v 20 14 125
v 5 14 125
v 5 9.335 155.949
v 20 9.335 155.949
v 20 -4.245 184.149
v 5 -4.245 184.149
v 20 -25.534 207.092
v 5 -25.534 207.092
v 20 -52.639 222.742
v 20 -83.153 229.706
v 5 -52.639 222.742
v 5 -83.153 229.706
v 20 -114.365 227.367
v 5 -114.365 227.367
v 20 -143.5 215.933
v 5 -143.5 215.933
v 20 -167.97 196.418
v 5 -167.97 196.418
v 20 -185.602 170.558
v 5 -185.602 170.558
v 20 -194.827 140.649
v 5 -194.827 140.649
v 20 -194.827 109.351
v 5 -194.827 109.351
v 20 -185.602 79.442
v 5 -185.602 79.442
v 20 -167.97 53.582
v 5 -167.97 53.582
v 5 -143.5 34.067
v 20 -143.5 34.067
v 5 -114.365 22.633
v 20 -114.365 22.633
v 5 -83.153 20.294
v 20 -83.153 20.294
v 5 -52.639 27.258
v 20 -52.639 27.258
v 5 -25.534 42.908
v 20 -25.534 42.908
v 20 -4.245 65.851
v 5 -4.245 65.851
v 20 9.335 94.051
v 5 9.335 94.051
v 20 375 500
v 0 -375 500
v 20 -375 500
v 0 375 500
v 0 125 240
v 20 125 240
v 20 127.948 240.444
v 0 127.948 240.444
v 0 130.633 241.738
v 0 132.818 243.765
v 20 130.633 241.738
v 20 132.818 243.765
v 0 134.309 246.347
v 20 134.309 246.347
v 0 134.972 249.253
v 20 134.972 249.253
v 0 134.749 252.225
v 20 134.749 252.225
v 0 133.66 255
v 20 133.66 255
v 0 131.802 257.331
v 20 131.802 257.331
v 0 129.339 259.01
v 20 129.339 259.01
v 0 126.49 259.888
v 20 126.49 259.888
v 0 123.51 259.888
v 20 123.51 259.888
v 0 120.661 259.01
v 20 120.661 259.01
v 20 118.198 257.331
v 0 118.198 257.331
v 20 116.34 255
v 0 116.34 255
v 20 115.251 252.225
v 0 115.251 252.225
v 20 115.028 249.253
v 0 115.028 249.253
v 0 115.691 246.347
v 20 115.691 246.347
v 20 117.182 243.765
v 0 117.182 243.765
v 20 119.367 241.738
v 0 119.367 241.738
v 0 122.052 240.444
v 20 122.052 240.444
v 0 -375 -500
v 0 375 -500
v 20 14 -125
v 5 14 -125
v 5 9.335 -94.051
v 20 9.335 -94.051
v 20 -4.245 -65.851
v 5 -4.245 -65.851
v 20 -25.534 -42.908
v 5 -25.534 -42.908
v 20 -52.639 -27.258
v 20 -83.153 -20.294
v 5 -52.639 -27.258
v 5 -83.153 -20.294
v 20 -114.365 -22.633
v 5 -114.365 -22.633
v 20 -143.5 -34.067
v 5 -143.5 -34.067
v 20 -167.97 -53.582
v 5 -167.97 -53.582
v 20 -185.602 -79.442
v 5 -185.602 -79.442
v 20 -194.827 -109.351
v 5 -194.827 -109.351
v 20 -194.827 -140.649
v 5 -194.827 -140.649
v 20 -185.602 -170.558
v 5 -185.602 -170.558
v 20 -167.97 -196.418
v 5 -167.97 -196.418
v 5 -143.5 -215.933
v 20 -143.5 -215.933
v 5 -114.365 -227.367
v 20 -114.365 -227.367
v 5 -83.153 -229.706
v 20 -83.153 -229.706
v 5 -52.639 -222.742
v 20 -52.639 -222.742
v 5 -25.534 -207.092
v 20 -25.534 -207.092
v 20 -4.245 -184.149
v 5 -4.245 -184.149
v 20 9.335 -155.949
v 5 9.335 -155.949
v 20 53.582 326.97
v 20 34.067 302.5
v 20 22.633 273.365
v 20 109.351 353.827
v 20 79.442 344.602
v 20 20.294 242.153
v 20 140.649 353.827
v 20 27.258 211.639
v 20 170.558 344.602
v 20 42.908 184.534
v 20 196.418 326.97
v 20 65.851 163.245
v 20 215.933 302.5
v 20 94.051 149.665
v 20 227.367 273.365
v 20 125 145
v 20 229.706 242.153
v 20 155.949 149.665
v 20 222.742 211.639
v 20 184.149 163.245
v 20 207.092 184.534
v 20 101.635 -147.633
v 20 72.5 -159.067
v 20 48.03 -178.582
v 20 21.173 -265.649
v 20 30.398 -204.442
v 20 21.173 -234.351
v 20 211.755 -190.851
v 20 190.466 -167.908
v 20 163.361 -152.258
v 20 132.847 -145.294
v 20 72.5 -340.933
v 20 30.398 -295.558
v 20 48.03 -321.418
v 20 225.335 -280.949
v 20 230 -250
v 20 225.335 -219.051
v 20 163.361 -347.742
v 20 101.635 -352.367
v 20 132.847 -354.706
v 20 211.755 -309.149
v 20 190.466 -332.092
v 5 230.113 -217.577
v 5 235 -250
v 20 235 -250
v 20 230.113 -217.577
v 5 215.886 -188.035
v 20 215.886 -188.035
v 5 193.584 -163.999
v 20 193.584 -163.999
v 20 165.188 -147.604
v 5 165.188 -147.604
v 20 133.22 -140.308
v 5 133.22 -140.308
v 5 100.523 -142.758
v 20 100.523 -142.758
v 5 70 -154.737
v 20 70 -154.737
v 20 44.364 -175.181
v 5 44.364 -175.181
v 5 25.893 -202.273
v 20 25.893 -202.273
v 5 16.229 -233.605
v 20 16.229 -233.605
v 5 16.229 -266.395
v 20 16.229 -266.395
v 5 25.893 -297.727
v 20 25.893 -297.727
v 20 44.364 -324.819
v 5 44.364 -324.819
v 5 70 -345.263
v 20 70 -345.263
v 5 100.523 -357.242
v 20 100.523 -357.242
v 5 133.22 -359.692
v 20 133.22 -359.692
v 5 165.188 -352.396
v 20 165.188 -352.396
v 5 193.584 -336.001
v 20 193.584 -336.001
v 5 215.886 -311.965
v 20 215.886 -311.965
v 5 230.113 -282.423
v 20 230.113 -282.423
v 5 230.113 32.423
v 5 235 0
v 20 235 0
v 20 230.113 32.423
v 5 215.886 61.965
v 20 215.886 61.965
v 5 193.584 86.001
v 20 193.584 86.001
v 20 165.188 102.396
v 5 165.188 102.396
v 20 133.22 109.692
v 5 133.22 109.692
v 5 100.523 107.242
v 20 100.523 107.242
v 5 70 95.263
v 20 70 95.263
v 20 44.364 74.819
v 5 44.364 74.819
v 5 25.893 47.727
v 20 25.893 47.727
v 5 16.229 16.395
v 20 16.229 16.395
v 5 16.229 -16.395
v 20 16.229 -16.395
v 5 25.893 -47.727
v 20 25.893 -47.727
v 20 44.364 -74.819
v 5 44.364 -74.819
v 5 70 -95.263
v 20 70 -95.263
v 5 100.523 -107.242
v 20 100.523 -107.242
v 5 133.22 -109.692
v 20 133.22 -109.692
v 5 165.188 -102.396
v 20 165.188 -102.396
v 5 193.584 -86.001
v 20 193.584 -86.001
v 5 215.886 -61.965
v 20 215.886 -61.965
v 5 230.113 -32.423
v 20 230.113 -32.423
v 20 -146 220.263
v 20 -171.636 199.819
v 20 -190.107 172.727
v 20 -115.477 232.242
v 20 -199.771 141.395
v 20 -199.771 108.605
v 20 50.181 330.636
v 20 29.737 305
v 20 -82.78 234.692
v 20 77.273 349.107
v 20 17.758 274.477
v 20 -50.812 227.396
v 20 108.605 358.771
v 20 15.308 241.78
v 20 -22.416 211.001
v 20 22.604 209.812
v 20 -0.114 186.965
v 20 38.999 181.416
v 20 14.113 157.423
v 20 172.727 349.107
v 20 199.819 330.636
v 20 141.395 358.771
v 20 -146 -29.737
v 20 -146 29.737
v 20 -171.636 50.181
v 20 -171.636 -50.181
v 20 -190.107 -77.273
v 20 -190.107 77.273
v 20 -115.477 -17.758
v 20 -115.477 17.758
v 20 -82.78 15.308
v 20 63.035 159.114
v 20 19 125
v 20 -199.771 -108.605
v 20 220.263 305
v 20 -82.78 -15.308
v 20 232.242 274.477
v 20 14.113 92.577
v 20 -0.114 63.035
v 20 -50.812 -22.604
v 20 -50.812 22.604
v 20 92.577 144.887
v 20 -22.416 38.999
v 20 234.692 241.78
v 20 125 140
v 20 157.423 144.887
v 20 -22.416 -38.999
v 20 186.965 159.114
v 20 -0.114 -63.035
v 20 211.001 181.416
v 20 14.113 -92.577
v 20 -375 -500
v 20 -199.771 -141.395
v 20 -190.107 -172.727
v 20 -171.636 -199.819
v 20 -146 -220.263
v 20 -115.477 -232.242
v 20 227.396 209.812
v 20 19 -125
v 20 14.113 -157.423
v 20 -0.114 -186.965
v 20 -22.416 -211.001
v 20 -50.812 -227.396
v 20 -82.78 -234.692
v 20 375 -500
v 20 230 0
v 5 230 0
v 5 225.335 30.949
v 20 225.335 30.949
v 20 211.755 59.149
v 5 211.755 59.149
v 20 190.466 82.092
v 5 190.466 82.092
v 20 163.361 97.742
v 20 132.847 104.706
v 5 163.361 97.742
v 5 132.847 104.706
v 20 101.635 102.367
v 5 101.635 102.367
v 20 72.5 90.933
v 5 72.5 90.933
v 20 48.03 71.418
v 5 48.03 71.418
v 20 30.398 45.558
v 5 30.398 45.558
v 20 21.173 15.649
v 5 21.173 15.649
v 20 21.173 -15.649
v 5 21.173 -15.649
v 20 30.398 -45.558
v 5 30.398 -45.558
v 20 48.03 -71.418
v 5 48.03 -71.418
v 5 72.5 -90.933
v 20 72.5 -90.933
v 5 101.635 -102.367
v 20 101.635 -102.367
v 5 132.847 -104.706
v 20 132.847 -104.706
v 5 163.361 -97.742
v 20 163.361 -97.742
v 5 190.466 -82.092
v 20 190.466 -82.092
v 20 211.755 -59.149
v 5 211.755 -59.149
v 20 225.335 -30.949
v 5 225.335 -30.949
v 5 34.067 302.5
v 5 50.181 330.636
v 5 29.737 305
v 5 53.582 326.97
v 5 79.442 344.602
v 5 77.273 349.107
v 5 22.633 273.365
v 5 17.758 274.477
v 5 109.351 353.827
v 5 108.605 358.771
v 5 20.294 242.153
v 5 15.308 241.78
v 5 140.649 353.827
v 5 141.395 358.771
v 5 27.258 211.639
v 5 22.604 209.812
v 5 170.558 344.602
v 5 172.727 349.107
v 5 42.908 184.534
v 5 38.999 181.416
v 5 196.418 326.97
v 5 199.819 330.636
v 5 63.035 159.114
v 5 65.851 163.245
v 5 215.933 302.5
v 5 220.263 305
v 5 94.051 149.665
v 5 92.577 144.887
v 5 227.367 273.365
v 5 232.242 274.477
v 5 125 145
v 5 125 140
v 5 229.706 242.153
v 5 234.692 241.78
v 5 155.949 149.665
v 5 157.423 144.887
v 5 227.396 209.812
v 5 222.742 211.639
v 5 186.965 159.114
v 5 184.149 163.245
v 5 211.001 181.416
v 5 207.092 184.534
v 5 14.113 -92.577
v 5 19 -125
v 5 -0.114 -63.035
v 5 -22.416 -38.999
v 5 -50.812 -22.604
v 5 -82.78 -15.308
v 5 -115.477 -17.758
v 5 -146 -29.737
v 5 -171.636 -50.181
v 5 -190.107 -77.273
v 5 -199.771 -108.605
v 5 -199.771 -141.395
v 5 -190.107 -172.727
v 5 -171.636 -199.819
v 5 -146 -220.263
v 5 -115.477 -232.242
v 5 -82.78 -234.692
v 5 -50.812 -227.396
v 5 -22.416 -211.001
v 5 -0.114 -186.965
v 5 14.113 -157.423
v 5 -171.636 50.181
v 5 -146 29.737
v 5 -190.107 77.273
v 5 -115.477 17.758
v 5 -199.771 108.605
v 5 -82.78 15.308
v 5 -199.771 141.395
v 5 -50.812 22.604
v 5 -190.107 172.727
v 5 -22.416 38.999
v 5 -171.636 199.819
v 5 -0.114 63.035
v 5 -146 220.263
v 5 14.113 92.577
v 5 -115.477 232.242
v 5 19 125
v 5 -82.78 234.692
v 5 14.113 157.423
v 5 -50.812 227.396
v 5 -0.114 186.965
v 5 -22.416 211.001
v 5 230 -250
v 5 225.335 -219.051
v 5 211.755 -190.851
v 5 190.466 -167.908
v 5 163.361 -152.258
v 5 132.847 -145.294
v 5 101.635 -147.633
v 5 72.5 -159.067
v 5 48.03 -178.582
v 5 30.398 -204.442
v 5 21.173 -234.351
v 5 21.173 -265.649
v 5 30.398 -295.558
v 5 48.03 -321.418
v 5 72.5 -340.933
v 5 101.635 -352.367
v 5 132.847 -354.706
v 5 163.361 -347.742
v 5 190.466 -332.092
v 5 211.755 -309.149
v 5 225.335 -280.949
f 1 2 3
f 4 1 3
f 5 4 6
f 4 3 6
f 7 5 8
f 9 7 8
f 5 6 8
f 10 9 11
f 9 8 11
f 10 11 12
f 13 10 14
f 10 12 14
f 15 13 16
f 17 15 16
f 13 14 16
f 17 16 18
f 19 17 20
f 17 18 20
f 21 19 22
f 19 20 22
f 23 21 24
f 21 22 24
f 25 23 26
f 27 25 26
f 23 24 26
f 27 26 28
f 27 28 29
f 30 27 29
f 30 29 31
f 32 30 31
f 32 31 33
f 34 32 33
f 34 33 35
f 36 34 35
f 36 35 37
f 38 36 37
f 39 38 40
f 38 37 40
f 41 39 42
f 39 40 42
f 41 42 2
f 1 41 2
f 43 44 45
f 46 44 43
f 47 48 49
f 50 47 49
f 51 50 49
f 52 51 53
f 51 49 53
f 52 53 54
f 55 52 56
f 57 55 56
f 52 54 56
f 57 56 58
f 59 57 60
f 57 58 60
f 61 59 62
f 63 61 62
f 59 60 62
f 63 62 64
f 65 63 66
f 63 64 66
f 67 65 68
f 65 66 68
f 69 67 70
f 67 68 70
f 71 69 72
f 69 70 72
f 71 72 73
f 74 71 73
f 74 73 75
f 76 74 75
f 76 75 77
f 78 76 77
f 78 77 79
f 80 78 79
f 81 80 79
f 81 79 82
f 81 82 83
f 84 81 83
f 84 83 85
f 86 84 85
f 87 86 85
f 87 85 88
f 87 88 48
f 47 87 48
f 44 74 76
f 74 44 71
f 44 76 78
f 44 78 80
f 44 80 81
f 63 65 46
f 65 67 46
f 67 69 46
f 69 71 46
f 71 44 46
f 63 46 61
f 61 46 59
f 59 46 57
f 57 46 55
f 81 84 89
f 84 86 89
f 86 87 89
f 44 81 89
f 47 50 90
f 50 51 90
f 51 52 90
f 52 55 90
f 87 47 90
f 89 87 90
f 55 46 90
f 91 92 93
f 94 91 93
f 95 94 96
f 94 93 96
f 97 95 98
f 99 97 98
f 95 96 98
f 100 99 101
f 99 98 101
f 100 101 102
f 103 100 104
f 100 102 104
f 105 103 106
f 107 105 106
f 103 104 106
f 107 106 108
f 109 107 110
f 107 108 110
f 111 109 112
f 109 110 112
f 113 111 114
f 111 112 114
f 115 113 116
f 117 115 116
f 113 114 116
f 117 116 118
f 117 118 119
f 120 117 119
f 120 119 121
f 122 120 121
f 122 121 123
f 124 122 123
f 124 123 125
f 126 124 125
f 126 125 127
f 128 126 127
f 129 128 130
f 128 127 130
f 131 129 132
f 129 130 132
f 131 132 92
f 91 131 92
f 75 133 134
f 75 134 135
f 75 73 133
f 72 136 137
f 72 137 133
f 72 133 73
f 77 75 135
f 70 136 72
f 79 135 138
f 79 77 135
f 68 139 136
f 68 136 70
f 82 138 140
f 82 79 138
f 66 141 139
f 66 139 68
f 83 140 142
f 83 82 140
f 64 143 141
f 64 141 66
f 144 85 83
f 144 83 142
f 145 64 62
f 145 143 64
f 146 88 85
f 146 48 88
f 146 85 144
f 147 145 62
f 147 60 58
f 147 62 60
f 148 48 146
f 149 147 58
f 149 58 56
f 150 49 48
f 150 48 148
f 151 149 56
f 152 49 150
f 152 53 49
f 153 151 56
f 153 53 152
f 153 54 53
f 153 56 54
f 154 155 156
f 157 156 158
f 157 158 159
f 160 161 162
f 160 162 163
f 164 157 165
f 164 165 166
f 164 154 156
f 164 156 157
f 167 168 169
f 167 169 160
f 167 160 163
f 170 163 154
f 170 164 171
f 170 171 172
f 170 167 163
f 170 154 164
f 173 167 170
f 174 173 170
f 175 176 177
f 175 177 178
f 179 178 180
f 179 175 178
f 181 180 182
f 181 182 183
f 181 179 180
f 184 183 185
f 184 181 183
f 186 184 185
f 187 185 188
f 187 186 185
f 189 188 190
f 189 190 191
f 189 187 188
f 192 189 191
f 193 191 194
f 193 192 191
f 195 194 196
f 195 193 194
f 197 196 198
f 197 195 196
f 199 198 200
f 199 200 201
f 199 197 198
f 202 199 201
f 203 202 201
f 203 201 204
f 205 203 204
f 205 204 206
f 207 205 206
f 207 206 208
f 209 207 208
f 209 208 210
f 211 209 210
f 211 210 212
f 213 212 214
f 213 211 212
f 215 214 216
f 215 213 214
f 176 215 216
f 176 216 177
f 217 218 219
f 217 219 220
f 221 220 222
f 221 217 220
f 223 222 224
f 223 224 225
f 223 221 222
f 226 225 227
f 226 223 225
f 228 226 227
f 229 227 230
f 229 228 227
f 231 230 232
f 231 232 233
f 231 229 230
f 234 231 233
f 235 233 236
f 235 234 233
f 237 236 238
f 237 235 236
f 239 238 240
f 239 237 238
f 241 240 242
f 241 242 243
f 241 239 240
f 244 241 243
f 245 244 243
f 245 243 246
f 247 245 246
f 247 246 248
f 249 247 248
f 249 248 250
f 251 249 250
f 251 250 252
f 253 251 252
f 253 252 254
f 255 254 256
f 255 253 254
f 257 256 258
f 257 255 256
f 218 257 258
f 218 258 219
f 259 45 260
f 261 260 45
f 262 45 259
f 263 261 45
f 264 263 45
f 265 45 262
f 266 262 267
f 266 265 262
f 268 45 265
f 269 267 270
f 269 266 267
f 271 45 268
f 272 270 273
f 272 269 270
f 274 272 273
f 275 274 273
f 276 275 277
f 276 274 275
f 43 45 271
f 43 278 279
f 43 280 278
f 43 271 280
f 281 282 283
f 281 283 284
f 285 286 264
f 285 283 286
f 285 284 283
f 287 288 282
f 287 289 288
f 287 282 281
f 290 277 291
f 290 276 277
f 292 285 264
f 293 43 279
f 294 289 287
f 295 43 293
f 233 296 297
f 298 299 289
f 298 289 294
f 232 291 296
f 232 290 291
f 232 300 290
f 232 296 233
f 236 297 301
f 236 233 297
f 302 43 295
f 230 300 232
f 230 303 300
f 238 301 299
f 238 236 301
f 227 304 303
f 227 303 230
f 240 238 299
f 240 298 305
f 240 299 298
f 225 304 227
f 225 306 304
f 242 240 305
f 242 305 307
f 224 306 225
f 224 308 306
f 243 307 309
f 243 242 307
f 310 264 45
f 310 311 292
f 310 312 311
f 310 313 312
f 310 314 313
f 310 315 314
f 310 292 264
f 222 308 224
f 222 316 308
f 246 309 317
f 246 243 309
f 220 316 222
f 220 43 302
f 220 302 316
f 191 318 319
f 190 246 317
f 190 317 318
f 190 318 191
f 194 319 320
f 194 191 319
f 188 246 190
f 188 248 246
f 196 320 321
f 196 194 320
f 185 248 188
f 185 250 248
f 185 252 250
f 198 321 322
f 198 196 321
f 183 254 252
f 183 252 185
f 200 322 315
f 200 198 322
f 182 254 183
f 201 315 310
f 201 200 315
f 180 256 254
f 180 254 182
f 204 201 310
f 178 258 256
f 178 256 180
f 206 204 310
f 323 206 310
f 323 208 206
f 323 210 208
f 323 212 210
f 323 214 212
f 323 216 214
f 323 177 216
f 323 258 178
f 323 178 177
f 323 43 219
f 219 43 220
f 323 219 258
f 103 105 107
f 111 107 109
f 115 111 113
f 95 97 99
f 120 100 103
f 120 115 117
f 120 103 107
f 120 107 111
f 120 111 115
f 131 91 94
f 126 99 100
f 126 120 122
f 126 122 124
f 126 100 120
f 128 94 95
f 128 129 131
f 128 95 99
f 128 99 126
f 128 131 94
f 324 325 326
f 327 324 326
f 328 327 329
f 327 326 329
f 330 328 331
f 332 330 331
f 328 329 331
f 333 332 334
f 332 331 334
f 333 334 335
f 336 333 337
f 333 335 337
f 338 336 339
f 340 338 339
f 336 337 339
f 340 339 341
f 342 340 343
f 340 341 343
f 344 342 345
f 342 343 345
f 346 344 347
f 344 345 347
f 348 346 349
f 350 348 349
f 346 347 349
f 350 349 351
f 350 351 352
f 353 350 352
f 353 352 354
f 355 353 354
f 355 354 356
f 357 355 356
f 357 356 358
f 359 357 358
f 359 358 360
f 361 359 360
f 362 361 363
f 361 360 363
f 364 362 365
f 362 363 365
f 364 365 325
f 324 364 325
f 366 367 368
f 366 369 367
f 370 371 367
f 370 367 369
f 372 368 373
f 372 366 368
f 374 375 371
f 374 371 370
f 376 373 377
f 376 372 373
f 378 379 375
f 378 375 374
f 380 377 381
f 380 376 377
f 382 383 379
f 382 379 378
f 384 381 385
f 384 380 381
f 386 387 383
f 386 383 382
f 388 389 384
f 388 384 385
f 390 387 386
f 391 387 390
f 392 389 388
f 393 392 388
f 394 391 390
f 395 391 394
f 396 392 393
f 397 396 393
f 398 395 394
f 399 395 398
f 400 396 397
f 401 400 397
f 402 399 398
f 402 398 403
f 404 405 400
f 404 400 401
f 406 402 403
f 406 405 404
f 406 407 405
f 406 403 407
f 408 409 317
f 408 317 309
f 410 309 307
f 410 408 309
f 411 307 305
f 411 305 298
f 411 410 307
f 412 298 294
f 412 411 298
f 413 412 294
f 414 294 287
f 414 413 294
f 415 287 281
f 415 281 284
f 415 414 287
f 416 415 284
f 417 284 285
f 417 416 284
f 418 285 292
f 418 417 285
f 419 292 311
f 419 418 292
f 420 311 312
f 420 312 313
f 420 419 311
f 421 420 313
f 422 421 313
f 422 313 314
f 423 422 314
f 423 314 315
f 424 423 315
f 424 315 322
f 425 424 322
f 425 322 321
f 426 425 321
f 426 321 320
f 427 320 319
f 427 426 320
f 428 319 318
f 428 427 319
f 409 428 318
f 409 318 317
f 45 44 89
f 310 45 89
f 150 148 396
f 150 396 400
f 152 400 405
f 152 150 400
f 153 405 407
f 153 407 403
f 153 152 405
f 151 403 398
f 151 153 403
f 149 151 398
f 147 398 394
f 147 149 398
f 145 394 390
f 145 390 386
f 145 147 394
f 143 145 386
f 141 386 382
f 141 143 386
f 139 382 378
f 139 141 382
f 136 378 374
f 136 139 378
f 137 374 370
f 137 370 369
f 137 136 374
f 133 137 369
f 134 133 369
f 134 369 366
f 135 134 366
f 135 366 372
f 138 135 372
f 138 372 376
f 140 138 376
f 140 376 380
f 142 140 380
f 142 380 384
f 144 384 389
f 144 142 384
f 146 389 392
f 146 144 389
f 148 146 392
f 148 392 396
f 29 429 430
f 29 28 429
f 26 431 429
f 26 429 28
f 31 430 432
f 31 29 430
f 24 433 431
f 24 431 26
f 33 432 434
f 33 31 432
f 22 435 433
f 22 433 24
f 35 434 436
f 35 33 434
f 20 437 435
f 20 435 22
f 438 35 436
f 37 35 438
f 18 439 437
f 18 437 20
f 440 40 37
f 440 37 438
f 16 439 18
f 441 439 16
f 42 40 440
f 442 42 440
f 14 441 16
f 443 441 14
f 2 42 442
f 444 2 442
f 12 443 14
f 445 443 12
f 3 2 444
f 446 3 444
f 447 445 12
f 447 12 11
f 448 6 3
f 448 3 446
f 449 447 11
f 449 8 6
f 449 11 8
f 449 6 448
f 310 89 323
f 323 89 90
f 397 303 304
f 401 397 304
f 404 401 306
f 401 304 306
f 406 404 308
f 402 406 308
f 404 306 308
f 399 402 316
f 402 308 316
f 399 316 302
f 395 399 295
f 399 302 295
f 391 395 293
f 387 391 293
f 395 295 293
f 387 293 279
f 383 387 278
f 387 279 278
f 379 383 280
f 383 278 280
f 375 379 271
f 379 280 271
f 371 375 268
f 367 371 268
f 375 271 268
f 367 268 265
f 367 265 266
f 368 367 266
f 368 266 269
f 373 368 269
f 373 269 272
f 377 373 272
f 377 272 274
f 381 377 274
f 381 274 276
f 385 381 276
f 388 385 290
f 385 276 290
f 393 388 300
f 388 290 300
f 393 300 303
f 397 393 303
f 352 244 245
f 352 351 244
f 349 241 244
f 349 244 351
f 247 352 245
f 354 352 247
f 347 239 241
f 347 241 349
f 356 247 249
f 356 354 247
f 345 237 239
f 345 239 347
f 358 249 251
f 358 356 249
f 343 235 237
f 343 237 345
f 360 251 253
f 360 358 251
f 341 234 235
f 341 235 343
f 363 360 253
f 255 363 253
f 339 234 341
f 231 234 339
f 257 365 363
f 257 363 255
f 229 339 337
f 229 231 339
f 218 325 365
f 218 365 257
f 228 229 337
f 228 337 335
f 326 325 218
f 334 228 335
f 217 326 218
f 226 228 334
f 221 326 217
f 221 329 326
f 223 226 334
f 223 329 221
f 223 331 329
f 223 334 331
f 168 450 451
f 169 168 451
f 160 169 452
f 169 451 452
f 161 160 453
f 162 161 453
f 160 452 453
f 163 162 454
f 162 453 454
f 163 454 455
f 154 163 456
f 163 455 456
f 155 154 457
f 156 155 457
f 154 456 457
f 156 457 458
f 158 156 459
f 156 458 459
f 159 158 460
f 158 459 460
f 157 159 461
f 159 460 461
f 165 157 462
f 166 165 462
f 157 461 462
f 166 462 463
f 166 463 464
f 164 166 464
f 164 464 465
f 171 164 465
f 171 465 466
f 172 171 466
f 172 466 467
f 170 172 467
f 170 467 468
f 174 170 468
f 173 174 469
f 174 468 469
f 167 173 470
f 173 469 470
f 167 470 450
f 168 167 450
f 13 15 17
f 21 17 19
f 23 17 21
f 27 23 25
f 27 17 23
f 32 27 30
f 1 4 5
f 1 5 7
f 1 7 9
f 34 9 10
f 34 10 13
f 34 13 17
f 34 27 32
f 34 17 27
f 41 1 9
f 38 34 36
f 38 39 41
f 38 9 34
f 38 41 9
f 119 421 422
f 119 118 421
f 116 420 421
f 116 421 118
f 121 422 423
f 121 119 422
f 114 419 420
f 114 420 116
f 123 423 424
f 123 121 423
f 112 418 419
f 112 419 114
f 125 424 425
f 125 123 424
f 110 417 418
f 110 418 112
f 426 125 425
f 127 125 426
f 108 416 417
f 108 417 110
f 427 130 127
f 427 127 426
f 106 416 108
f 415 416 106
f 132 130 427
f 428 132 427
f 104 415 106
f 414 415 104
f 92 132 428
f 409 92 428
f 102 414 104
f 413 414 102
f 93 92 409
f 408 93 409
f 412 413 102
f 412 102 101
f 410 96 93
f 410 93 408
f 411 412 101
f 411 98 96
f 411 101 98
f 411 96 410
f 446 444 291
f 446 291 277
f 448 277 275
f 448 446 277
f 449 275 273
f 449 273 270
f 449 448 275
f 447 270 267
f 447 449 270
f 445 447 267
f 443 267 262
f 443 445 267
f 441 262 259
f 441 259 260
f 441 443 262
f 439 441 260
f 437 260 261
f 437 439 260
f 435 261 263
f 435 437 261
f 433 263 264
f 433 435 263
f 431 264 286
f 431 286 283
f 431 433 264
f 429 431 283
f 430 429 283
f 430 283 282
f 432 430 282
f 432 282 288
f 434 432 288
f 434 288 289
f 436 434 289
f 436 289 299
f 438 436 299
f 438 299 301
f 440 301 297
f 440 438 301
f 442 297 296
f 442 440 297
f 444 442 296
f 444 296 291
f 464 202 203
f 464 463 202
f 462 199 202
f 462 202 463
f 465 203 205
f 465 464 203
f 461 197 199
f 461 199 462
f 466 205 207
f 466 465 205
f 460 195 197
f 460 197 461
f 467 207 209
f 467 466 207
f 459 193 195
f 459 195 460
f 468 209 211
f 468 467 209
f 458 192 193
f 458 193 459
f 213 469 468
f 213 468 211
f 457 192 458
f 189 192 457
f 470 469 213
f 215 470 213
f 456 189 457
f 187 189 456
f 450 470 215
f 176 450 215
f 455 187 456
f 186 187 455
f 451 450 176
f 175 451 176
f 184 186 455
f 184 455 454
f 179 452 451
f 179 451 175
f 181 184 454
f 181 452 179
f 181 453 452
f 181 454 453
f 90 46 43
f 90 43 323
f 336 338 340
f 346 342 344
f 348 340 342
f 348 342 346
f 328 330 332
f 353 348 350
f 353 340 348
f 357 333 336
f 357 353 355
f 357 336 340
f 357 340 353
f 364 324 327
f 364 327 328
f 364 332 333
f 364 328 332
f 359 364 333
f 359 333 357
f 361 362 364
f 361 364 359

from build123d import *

# Parameters (mm, degrees)
MAIN_BOARD_W          = 1000
MAIN_BOARD_H          = 750
MAINBOARD_DEPTH       = 20
CUT_EXTRUDE9_REACH    = 627.32
SKETCH5_R             = 10
SKETCH5_8_R           = 110
SKETCH5_8_R_2         = 105
CUT_EXTRUDE10_DEPTH   = 15
LPATTERN1_START       = 5
LPATTERN1_OUTLINE_R   = 110
LPATTERN1_OUTLINE_R_2 = 105
LPATTERN1_DEPTH       = 15


# Read off the part's stored shape, not the designer's step: LPattern1
with BuildPart() as part:
    # Main Board → MainBoard (new body)
    with BuildSketch(Plane(origin=(0, 0, 0), x_dir=(0, 0, -1), z_dir=(1, 0, 0))):
        Rectangle(MAIN_BOARD_W, MAIN_BOARD_H)
    extrude(amount=MAINBOARD_DEPTH)

    # Sketch5 → Cut-Extrude9 (cut, up to next)
    with BuildSketch(Plane(origin=(20, 0, 0), x_dir=(0, 0, -1), z_dir=(1, 0, 0)), mode=Mode.PRIVATE) as cut_extrude9_sk1:
        with Locations((-250, 125)):
            Circle(SKETCH5_R)
    cut_extrude9_tool1 = extrude(cut_extrude9_sk1.sketch, amount=-CUT_EXTRUDE9_REACH, mode=Mode.PRIVATE) & part.part
    add(cut_extrude9_tool1.solids().sort_by_distance((20, 125, 250))[0], mode=Mode.SUBTRACT)

    # Sketch5<8> → Cut-Extrude10 (cut)
    with BuildSketch(Plane(origin=(20, 0, 0), x_dir=(0, 0, -1), z_dir=(1, 0, 0))):
        with Locations((-250, 125)):
            Circle(SKETCH5_8_R)
        with Locations((-250, 125)):
            Circle(SKETCH5_8_R_2, mode=Mode.SUBTRACT)
    extrude(amount=-CUT_EXTRUDE10_DEPTH, mode=Mode.SUBTRACT)

    # LPattern1 outline → LPattern1 (cut)
    # profile 1 of 4: a face of its own
    with BuildSketch(Plane.YZ.offset(LPATTERN1_START)):
        with Locations((-91, 125)):
            Circle(LPATTERN1_OUTLINE_R)
        with Locations((-91, 125)):
            Circle(LPATTERN1_OUTLINE_R_2, mode=Mode.SUBTRACT)
    # profile 2 of 4: a face of its own
    with BuildSketch(Plane.YZ.offset(LPATTERN1_START)):
        with Locations((125, -250)):
            Circle(LPATTERN1_OUTLINE_R)
        with Locations((125, -250)):
            Circle(LPATTERN1_OUTLINE_R_2, mode=Mode.SUBTRACT)
    # profile 3 of 4: a face of its own
    with BuildSketch(Plane.YZ.offset(LPATTERN1_START)):
        with Locations((125, 0)):
            Circle(LPATTERN1_OUTLINE_R)
        with Locations((125, 0)):
            Circle(LPATTERN1_OUTLINE_R_2, mode=Mode.SUBTRACT)
    # profile 4 of 4: a face of its own
    with BuildSketch(Plane.YZ.offset(LPATTERN1_START)):
        with Locations((-91, -125)):
            Circle(LPATTERN1_OUTLINE_R)
        with Locations((-91, -125)):
            Circle(LPATTERN1_OUTLINE_R_2, mode=Mode.SUBTRACT)
    extrude(amount=LPATTERN1_DEPTH, mode=Mode.SUBTRACT)


solid = part.part
